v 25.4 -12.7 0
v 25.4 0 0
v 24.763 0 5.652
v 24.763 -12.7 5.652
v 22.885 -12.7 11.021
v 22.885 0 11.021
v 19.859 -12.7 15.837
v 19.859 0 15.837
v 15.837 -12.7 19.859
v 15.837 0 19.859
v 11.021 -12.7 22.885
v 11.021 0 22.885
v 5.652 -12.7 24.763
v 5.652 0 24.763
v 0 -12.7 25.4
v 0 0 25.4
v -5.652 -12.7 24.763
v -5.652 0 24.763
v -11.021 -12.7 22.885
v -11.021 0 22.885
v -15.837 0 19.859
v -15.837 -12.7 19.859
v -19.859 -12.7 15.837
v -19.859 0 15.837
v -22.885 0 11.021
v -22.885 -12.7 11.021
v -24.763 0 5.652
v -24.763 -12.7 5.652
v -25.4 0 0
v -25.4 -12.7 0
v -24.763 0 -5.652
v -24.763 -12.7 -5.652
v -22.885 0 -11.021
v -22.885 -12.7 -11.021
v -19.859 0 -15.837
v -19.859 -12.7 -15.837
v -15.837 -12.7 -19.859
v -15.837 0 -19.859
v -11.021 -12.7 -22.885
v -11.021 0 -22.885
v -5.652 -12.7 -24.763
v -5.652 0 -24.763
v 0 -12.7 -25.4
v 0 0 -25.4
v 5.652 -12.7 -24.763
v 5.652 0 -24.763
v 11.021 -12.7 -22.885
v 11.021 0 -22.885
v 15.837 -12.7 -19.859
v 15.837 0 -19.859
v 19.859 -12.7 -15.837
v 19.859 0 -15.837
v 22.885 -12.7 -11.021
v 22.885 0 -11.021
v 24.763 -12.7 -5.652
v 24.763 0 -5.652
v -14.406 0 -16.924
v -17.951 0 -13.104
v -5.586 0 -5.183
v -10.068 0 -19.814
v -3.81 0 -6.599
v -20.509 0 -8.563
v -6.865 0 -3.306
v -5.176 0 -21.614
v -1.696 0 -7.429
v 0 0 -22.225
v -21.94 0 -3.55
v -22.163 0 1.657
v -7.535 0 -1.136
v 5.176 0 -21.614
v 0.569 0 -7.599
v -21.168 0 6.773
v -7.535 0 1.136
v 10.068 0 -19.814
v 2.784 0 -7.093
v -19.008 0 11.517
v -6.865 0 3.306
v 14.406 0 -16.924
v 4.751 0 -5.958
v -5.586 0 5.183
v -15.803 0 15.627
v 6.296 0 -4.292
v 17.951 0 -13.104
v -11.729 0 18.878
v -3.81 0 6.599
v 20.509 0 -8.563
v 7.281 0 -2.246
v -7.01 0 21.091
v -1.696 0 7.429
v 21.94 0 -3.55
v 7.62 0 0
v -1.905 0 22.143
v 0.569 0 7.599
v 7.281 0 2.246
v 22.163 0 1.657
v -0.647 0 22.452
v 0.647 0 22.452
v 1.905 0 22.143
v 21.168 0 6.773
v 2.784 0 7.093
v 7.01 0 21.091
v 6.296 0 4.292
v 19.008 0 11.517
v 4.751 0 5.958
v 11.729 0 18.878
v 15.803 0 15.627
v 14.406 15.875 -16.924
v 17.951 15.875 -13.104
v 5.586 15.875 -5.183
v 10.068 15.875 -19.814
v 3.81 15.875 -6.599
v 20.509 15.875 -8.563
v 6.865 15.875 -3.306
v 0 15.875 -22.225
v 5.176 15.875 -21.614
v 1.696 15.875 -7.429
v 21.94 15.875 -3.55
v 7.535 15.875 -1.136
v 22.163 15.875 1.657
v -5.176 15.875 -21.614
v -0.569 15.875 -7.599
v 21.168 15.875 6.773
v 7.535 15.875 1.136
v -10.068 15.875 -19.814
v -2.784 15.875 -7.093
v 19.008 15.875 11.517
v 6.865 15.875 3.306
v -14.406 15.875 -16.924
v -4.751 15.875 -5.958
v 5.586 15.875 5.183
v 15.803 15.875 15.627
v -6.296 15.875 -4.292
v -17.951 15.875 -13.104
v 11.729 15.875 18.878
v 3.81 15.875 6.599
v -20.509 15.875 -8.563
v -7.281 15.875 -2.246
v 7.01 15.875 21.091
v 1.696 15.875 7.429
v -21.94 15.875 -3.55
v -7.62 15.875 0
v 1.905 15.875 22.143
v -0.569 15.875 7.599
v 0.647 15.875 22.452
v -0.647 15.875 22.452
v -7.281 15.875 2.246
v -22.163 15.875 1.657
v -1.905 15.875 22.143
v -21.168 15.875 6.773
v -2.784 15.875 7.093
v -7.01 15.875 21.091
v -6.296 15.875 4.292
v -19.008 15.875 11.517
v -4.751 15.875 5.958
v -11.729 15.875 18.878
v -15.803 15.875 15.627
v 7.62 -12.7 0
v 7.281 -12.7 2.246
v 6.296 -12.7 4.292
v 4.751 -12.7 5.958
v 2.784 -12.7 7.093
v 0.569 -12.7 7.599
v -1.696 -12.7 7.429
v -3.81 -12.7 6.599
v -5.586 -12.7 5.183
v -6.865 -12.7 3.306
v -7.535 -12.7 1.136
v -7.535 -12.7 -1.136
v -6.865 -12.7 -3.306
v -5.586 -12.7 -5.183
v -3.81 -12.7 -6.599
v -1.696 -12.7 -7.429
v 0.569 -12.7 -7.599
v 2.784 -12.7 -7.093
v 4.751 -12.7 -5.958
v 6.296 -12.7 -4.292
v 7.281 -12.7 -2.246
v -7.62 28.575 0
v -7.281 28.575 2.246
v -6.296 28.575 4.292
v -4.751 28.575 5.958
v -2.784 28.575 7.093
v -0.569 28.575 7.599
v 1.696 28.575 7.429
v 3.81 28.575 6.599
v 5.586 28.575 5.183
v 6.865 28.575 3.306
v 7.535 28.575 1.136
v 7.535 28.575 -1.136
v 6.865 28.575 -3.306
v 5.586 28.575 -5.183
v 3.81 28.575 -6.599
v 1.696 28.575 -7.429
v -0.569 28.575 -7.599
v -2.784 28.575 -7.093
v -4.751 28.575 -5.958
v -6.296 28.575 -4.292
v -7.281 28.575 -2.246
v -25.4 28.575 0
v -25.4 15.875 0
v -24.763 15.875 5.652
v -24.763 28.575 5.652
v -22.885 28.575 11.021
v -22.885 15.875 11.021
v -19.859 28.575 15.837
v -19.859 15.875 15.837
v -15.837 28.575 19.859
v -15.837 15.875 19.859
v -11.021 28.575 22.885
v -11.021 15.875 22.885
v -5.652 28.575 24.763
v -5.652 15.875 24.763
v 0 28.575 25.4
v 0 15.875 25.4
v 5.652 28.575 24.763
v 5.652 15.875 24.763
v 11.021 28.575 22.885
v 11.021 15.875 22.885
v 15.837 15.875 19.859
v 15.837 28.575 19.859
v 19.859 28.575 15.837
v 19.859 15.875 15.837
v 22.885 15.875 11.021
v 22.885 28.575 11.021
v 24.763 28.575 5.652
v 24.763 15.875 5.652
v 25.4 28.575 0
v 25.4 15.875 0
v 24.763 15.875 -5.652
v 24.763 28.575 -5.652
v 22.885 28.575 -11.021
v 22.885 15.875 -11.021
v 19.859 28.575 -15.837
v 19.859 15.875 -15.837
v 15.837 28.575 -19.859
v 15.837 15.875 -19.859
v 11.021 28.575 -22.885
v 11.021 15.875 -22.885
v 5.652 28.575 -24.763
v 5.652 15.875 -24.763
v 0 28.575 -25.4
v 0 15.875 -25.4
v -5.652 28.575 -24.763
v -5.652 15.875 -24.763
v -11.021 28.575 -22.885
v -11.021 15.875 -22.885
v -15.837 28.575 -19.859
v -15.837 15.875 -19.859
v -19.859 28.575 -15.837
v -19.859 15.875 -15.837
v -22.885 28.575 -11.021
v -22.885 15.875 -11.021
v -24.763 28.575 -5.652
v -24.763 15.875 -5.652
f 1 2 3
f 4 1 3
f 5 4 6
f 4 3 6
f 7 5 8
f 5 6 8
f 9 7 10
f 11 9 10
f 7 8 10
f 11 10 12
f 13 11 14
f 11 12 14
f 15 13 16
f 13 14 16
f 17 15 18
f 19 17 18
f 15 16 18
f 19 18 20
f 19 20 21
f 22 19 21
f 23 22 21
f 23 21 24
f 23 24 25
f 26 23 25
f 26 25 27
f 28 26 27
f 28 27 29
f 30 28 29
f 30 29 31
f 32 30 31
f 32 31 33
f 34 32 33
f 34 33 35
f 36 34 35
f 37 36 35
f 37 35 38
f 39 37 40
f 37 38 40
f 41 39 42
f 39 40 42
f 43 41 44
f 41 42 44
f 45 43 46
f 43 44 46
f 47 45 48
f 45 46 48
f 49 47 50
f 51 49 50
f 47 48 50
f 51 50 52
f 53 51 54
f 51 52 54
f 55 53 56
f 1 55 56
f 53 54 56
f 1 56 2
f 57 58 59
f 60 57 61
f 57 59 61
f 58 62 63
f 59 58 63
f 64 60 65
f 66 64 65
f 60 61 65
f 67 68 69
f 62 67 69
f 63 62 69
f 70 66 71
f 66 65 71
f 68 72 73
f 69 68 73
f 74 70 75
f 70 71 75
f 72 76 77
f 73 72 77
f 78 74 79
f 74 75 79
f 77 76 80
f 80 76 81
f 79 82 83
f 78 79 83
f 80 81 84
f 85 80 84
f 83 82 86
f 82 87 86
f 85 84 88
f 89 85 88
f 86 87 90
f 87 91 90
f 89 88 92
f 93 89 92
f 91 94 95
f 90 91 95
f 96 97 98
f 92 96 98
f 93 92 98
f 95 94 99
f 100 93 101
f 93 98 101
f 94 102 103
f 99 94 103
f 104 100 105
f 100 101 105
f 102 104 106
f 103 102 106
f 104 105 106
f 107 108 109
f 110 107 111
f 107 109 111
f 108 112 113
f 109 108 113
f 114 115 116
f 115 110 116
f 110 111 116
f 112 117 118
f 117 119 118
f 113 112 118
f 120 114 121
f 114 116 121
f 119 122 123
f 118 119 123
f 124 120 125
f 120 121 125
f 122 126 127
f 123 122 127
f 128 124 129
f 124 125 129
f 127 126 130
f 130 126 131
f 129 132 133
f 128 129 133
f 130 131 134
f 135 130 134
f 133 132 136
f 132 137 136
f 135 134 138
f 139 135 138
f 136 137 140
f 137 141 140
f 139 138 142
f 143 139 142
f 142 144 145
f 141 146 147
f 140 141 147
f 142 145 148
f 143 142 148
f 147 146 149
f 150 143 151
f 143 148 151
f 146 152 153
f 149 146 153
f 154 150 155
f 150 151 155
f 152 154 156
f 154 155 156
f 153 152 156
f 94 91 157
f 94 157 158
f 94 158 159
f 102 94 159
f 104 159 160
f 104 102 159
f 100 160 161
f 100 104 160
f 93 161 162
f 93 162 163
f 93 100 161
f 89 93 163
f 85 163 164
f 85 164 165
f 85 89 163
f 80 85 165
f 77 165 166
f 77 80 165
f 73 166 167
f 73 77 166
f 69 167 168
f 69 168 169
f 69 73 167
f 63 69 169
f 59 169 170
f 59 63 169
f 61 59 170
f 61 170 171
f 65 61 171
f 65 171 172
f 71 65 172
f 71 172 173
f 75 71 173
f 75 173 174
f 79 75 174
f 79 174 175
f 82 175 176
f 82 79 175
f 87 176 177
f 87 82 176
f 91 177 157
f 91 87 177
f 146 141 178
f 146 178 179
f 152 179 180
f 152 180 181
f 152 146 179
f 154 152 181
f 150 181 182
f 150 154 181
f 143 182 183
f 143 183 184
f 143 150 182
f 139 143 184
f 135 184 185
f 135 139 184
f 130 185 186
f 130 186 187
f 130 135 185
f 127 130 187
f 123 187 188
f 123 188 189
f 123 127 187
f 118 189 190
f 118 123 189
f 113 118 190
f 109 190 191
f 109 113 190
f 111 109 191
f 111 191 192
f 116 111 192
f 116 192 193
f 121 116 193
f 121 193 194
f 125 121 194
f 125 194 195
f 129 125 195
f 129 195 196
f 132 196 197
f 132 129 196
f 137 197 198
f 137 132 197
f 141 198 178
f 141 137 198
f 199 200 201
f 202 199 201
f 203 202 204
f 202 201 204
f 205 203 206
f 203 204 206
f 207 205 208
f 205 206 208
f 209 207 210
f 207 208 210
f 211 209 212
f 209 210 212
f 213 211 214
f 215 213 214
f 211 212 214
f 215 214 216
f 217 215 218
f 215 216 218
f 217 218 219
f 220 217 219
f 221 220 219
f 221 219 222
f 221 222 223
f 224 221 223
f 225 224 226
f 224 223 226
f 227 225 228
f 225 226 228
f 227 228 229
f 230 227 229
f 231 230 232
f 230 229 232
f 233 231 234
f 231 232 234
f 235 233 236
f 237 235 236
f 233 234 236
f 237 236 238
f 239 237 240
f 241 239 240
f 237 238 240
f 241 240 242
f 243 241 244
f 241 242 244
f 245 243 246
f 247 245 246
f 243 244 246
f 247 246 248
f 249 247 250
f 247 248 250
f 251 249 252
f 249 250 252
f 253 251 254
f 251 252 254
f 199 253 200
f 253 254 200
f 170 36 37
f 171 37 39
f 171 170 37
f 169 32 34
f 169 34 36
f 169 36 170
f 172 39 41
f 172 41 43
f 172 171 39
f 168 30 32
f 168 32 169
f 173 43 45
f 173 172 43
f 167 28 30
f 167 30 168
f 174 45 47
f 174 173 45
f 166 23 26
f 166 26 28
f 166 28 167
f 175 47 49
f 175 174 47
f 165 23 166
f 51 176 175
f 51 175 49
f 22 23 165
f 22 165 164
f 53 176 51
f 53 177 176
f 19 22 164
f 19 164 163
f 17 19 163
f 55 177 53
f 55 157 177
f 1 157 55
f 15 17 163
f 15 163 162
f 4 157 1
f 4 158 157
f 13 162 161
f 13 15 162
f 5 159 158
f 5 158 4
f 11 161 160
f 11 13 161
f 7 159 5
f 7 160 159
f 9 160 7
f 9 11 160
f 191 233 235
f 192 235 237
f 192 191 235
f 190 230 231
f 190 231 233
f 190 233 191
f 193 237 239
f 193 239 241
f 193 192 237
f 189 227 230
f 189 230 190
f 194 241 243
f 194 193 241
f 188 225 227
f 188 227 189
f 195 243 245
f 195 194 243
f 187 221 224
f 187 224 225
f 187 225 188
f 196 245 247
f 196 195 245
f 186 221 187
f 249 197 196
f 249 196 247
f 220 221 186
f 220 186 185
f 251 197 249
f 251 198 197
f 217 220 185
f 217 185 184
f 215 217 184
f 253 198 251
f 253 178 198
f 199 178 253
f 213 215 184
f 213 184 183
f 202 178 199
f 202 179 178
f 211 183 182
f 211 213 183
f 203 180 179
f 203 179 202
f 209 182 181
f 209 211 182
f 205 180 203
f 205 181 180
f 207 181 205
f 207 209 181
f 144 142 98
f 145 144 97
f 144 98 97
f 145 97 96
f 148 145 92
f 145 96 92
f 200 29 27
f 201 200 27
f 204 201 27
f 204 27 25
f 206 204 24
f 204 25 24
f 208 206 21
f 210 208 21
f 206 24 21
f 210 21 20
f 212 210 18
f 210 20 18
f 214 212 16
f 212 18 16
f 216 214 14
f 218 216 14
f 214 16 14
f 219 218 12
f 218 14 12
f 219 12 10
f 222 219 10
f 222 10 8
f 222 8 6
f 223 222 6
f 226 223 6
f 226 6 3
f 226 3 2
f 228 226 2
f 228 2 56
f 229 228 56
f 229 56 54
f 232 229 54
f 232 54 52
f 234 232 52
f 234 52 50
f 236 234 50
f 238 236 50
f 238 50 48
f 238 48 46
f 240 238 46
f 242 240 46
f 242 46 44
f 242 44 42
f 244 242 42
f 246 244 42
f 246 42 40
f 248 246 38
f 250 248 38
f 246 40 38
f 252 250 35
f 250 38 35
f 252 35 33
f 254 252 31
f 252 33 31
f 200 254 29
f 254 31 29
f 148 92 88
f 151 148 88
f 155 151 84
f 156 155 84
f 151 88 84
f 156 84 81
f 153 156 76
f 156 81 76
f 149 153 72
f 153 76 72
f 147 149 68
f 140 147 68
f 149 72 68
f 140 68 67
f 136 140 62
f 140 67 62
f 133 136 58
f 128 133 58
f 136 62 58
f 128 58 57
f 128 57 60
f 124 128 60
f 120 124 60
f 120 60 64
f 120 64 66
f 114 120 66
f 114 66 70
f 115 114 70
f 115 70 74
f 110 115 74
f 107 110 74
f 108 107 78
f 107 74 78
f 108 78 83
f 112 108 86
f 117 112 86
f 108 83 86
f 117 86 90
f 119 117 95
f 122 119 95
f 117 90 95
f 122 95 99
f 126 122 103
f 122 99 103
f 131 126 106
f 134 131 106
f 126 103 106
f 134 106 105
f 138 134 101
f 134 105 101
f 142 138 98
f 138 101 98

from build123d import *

# Parameters (mm, degrees)
F0_R     = 25.4
F0_R_2   = 7.62
F1_DEPTH = 12.7
F2_R     = 25.4
F3_DEPTH = 15.875
F4_R     = 25.4
F4_R_2   = 7.62
F5_DEPTH = 12.7


with BuildPart() as f1:
    # F0 (on Front) → F1 (new body)
    with BuildSketch(Plane.XZ):
        Circle(F0_R)
        Circle(F0_R_2, mode=Mode.SUBTRACT)
    extrude(amount=F1_DEPTH)

    # F2 (on face) → F3 (join)
    with BuildSketch(Plane(origin=(0, 0, 0), x_dir=(-1, 0, 0), z_dir=(0, 1, 0))):
        Circle(F2_R)
        with BuildLine():
            ThreePointArc((1.905, 22.143207), (0, -22.225), (-1.905, 22.143207))
            ThreePointArc((-1.905, 22.143207), (0, 22.491378), (1.905, 22.143207))
        make_face(mode=Mode.SUBTRACT)
    extrude(amount=F3_DEPTH)

    # F4 (on face) → F5 (join)
    with BuildSketch(Plane(origin=(0, 15.875, 0), x_dir=(-1, 0, 0), z_dir=(0, 1, 0))):
        Circle(F4_R)
        Circle(F4_R_2, mode=Mode.SUBTRACT)
    extrude(amount=F5_DEPTH)


solid = f1.part
